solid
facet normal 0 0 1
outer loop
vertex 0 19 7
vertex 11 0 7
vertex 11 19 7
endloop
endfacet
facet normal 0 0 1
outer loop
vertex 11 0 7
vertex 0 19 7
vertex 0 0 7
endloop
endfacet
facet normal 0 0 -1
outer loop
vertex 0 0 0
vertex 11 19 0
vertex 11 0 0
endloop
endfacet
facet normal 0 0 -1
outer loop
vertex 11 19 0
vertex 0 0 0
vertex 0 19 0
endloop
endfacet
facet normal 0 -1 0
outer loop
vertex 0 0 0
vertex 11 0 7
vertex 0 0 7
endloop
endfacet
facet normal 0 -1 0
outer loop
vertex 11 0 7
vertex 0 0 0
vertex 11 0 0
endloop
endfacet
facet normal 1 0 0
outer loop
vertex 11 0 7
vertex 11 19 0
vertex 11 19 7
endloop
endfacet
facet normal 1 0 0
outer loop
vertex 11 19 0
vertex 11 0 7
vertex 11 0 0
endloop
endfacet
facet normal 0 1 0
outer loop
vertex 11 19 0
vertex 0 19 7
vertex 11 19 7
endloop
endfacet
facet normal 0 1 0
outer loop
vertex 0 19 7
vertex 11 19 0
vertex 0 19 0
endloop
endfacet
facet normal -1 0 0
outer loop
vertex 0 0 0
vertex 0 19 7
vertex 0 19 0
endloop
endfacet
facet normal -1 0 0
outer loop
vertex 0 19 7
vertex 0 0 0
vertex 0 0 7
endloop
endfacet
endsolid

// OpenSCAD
// Generated by SolidPython 1.0.1 on 2020-07-29 00:46:55


cube(size = [11, 19, 7]);
/***********************************************
*********      SolidPython code:      **********
************************************************
 
# import packages: SolidPython
from solid import *
from solid.utils import *
from itertools import chain, combinations, permutations


class Resize:

    def __init__(self, scad_file):
        self.scad_file = scad_file
        #self.scad_file = import_scad(scad_file)
        # cone/cylinder param:
        self.r1 = 0
        self.r2 = 0
        self.h = 0
        # rectangular prism param:
        self.w = 0
        self.l = 0
        # ellipse param:
        self.r = 0

    # import OpenScad code (file name corresponds to shape)


    # classify shape + parameters
    def assign(self, param1, param2, param3):
        if self.scad_file == 'cone.scad':
            self.r1 = param1
            self.r2 = param2
            self.h = param3
        elif self.scad_file == 'cylinder.scad':
            self.r1 = param1
            self.r2 = param2
            self.h = param3
        elif self.scad_file == 'rectangularPrism.scad':
            self.h = param1
            self.l = param2
            self.w = param3
        else:
            self.r = param1
            self.h = param2

    # resize parameters
    def iterate(self):
        x = range(3, 20, 2)
        i = 1
        if self.scad_file == 'cone.scad':
            tempList = list(permutations(x, 2))
            for temp in tempList:
                param1 = temp[0]
                param2 = temp[1]
                filepath = 'produced_scad_files/' + 'cone' + str(param1) + '_' + str(param2) + '_' + '.scad'
                scad_render_to_file(cylinder(h=param1, r1=param2, r2=0), filepath)

        elif self.scad_file == 'cylinder.scad':
            tempList = list(permutations(x, 3))
            for temp in tempList:
                param1 = temp[0]
                param2 = temp[1]
                filepath = 'produced_scad_files/' + 'cylinder' + str(param1) + '_' + str(param2) + '_' + '.scad'
                scad_render_to_file(cylinder(h=param1, r1=param2, r2=param2), filepath)

        elif self.scad_file == 'rectangularPrism.scad':
            tempList = list(permutations(x, 3))
            for temp in tempList:
                param1 = temp[0]
                param2 = temp[1]
                param3 = temp[2]
                filepath = 'produced_scad_files/' + 'rectangularPrism' + str(param1) + '_' + str(param2) + '_' + str(
                    param3) + '.scad'
                scad_render_to_file(cube(size=(param1, param2, param3)), filepath)

        elif self.scad_file == 'ellipse.scad':
            tempList = list(permutations(x, 4))
            for temp in tempList:
                param1 = temp[0]
                param2 = temp[1]
                param3 = temp[2]
                param4 = temp[3]
                filepath = 'produced_scad_files/' + 'ellipse' + str(param1) + '_' + str(param2) + '_' + str(param3) + '_' + str(param4) + '.scad'
                scad_render_to_file(scale([param1, param2, param3])(sphere(r=param4)), filepath)

    def render_to_scadfile(self):
        scad_render_to_file(scad, 'example.scad') 
 
************************************************/
